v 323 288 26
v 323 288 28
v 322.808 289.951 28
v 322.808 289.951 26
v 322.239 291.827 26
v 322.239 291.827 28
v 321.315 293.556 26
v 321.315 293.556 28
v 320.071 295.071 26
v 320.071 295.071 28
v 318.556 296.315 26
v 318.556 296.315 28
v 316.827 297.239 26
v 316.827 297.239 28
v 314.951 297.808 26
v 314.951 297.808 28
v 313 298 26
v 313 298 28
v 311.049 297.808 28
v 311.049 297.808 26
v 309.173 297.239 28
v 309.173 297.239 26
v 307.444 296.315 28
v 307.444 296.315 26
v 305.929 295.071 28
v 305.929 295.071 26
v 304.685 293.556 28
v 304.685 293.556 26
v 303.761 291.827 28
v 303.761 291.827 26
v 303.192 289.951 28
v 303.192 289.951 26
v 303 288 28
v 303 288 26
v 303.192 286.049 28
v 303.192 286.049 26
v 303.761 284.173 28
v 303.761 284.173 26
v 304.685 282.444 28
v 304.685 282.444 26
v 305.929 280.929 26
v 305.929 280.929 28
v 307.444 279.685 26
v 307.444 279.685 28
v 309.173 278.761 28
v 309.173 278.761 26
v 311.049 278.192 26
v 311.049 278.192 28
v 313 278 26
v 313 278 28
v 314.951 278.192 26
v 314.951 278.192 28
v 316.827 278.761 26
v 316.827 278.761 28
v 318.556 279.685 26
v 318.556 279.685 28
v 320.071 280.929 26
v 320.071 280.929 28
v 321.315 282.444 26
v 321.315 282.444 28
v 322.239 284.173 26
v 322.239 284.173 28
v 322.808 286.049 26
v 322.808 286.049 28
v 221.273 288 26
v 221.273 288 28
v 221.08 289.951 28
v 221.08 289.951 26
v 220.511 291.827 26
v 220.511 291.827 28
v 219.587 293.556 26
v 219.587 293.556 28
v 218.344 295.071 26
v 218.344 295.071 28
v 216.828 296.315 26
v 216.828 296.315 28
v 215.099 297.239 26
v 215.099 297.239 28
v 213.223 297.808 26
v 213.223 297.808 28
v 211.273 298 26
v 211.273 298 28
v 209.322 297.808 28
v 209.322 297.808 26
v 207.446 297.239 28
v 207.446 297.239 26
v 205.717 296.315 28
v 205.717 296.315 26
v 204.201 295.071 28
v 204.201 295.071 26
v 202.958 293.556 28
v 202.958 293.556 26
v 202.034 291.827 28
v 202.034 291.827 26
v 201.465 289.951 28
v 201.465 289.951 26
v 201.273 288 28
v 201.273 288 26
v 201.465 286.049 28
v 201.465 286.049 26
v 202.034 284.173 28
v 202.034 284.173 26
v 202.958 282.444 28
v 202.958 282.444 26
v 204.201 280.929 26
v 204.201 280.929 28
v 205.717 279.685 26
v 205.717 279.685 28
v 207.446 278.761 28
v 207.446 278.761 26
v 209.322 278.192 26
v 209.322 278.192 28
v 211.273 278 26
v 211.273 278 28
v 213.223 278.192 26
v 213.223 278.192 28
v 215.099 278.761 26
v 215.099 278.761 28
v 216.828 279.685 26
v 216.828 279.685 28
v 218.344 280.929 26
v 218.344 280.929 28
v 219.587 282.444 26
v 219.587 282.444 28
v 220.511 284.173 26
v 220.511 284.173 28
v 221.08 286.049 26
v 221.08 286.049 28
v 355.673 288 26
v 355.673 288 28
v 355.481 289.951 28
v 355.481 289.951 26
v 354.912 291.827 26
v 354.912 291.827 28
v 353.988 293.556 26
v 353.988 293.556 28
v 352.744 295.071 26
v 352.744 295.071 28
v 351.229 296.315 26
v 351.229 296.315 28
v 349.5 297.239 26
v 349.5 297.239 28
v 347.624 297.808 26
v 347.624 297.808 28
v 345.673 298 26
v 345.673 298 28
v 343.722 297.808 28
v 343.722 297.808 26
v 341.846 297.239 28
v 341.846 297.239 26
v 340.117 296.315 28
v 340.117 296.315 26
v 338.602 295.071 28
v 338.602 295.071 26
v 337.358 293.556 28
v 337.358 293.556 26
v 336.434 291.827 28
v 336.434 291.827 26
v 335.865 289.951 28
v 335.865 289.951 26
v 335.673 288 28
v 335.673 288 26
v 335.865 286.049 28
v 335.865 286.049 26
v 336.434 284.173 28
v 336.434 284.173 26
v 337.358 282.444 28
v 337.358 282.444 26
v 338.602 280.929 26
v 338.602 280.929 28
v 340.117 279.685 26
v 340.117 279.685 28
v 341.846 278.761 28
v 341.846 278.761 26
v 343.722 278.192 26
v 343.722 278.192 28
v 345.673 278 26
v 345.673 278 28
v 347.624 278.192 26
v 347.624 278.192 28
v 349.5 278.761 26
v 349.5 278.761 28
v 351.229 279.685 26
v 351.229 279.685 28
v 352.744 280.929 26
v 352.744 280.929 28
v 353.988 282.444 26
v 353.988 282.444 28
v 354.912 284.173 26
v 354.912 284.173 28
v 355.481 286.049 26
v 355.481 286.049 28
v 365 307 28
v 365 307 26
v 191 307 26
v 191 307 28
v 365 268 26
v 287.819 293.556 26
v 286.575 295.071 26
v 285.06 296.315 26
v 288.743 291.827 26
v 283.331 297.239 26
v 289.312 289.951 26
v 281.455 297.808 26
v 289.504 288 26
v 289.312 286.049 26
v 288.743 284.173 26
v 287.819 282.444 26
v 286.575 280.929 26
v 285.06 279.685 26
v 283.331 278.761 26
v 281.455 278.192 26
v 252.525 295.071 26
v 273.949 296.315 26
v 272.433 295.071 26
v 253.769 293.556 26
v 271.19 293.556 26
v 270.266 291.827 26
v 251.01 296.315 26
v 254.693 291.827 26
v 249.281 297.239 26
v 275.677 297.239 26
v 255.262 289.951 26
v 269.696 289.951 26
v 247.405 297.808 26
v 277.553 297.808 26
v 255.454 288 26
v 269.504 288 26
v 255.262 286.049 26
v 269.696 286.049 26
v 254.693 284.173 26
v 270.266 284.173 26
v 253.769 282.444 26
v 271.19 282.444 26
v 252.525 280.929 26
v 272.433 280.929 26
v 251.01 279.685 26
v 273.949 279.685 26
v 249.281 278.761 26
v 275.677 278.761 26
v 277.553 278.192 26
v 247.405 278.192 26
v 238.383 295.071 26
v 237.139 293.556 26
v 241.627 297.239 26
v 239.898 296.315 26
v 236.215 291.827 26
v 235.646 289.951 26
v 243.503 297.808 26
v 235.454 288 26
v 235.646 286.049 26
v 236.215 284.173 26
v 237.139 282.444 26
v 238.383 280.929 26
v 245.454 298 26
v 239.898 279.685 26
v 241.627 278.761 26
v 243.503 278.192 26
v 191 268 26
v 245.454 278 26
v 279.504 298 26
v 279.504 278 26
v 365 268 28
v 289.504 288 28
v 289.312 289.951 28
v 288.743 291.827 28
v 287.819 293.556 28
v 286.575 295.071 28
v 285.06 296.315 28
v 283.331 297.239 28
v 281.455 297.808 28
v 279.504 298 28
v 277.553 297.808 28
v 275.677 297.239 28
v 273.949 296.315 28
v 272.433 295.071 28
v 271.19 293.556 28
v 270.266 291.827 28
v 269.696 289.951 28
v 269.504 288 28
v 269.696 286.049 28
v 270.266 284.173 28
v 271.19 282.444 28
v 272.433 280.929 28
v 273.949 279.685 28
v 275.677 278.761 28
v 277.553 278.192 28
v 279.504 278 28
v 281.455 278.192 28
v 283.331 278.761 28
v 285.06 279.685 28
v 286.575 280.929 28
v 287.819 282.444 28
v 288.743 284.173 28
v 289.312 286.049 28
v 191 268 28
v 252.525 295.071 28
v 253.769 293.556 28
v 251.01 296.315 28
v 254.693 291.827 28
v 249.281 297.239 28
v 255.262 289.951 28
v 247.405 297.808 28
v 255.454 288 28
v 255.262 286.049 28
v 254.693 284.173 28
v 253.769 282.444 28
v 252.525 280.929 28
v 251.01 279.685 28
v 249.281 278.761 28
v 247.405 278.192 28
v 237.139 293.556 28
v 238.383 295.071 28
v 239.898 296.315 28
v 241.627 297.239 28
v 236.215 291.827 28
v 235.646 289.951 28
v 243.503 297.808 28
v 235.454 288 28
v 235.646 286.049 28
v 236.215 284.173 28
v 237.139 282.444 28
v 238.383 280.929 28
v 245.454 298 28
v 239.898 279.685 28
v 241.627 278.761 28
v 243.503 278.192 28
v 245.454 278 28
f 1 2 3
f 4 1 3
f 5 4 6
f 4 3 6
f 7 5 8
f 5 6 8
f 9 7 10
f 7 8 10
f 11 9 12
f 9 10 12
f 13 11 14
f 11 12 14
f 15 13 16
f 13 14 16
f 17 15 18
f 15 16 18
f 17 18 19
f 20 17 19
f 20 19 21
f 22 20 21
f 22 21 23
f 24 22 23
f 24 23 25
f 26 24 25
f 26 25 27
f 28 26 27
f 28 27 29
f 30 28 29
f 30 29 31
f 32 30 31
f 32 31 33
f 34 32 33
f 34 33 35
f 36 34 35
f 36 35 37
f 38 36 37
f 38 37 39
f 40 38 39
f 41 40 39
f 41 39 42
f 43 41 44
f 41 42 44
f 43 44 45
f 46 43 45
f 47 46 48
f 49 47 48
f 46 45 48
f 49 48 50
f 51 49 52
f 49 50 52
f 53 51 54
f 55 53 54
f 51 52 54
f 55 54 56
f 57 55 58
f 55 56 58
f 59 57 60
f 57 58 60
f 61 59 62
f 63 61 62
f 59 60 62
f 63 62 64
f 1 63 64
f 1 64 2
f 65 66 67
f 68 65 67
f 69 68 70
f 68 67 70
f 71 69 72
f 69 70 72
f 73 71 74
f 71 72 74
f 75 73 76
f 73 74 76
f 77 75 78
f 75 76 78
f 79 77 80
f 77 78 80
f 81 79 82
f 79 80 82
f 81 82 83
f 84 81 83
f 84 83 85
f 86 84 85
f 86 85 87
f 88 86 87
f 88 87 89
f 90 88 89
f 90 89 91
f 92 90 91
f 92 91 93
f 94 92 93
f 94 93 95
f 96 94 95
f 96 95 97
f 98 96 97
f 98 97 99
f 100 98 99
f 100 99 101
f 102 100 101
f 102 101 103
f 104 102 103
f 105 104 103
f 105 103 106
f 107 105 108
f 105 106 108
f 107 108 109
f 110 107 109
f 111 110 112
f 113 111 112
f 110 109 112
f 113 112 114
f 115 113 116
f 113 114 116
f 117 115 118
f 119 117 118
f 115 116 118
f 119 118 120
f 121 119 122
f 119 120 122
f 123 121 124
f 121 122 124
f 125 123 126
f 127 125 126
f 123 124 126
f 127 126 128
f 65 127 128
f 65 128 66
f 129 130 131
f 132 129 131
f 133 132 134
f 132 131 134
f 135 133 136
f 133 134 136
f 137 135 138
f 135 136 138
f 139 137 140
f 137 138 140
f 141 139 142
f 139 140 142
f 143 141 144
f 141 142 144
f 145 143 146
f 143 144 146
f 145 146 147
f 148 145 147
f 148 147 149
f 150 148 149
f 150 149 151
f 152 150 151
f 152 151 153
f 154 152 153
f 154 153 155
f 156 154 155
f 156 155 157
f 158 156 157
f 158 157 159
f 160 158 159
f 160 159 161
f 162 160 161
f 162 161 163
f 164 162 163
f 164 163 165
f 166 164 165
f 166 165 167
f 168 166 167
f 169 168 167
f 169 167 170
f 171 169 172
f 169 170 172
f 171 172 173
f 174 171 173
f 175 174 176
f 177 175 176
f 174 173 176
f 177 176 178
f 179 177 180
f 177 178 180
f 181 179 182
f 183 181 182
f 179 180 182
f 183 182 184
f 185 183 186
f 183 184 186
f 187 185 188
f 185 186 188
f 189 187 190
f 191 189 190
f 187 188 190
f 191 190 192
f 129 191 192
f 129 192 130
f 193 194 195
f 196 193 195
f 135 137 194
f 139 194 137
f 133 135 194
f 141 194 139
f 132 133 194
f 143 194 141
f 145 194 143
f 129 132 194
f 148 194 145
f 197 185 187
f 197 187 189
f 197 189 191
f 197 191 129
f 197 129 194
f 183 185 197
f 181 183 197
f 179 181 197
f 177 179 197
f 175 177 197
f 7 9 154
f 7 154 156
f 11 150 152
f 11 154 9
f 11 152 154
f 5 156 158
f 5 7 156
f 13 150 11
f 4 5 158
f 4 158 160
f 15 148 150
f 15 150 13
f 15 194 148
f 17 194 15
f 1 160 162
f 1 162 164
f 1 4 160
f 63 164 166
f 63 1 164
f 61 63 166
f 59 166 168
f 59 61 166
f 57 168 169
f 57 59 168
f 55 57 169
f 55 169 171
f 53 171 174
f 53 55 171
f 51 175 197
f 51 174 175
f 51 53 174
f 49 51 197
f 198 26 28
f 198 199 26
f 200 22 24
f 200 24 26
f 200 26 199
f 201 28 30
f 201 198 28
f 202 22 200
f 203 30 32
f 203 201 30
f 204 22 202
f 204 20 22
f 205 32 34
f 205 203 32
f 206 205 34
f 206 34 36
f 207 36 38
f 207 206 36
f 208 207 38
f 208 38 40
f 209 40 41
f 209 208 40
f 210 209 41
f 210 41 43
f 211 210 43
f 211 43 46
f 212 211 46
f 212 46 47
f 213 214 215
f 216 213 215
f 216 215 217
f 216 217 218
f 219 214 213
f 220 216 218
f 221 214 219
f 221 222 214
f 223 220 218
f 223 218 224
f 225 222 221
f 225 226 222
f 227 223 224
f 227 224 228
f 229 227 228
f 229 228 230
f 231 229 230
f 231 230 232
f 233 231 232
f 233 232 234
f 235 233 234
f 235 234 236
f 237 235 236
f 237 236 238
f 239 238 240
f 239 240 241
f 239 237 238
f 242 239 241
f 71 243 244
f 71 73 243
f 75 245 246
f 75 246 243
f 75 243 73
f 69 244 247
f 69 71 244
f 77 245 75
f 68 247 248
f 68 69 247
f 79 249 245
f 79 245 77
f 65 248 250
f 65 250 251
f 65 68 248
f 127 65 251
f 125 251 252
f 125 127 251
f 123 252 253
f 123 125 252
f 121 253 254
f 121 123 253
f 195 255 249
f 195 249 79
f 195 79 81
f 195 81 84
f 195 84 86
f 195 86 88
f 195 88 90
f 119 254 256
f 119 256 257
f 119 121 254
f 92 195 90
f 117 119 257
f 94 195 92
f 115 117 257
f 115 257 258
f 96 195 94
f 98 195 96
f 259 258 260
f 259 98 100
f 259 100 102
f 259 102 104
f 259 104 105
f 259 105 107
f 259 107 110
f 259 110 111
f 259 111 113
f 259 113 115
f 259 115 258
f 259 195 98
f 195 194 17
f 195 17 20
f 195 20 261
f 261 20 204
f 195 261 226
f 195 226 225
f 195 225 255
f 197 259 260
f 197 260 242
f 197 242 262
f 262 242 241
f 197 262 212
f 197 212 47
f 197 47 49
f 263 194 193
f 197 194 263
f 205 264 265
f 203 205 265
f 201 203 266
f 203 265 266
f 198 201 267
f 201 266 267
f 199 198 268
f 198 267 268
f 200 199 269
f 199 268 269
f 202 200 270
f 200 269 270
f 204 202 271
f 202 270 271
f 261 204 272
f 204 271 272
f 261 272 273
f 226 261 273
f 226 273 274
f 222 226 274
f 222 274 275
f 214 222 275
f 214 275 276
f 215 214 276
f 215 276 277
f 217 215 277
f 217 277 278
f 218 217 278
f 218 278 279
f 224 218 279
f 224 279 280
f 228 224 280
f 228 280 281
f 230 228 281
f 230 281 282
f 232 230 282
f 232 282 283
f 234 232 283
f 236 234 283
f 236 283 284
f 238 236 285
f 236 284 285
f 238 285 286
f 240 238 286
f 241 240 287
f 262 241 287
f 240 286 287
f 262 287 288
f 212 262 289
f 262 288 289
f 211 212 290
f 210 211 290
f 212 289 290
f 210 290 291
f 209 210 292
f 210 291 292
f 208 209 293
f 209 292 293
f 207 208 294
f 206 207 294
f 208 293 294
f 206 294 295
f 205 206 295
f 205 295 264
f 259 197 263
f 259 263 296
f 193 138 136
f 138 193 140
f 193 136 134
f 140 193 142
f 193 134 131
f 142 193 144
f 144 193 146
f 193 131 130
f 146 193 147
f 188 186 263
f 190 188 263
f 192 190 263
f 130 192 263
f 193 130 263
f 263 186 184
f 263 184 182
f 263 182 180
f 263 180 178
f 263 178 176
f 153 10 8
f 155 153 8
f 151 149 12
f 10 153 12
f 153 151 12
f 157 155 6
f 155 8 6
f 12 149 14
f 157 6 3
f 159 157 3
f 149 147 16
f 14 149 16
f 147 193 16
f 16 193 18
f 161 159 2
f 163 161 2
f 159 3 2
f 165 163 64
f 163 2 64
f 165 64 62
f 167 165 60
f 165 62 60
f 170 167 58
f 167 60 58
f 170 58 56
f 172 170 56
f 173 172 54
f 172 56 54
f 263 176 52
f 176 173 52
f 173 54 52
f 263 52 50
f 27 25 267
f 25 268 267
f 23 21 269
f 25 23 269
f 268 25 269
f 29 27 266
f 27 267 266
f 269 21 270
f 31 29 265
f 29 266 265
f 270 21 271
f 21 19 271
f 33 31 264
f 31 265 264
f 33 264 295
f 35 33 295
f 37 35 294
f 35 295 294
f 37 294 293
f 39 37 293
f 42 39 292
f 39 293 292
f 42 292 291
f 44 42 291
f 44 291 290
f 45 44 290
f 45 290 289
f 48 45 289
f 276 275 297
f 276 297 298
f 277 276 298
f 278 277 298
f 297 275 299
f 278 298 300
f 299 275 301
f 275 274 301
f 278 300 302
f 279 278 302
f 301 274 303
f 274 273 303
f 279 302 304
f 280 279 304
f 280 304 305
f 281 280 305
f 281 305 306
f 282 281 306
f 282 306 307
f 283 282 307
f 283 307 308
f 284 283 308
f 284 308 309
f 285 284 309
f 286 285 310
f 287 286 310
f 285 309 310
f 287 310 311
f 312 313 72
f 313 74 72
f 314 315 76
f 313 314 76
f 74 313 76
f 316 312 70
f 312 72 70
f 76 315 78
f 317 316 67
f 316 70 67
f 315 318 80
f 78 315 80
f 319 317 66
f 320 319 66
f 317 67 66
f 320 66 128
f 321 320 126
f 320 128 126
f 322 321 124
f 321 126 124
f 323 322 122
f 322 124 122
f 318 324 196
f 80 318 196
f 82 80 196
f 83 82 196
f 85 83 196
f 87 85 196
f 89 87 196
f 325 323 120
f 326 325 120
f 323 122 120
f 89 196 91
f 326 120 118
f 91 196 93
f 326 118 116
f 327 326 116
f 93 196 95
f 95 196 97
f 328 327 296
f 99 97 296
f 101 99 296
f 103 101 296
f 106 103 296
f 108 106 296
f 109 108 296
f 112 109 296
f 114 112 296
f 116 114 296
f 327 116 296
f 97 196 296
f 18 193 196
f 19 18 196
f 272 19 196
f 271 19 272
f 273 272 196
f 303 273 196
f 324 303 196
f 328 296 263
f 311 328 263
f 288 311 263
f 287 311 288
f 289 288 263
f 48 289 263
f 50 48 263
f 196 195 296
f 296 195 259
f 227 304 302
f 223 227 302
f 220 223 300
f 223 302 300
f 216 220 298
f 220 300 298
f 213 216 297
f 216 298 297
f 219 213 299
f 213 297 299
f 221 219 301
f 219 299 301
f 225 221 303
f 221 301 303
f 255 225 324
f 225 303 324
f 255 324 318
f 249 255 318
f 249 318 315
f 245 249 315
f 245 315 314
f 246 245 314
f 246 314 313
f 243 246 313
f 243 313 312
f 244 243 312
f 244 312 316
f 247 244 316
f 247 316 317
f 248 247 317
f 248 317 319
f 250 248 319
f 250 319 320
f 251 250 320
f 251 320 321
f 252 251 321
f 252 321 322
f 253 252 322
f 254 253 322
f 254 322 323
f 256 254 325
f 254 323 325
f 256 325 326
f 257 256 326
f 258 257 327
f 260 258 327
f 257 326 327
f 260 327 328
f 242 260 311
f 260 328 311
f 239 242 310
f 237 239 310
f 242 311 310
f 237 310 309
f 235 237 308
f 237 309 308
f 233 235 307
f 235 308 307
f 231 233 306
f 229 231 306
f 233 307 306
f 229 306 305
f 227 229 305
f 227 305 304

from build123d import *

# Parameters (mm, degrees)
SKETCH167_R      = 10
EXTRUDE147_DEPTH = 4
BODY018_W        = 39
BODY018_H        = 174
EXTRUDE_DEPTH    = 2


with BuildPart() as extrude147:
    # Sketch167 → Extrude147 (new body)
    with BuildSketch(Plane.XY.offset(29)):
        with Locations((211.272537, 288)):
            Circle(SKETCH167_R)
        with Locations((245.453842, 288)):
            Circle(SKETCH167_R)
        with Locations((279.504333, 288)):
            Circle(SKETCH167_R)
        with Locations((345.672821, 288)):
            Circle(SKETCH167_R)
        with Locations((313, 288)):
            Circle(SKETCH167_R)
    extrude(amount=-EXTRUDE147_DEPTH)


with BuildPart() as cut010:
    # Body018 → Extrude (new body)
    with BuildSketch(Plane(origin=(278, 287.5, 26), x_dir=(0, -1, 0), z_dir=(0, 0, -1))):
        Rectangle(BODY018_W, BODY018_H)
    extrude(amount=-EXTRUDE_DEPTH)

    # Cut010: cut Extrude147
    add(extrude147.part, mode=Mode.SUBTRACT)


solid = cut010.part
